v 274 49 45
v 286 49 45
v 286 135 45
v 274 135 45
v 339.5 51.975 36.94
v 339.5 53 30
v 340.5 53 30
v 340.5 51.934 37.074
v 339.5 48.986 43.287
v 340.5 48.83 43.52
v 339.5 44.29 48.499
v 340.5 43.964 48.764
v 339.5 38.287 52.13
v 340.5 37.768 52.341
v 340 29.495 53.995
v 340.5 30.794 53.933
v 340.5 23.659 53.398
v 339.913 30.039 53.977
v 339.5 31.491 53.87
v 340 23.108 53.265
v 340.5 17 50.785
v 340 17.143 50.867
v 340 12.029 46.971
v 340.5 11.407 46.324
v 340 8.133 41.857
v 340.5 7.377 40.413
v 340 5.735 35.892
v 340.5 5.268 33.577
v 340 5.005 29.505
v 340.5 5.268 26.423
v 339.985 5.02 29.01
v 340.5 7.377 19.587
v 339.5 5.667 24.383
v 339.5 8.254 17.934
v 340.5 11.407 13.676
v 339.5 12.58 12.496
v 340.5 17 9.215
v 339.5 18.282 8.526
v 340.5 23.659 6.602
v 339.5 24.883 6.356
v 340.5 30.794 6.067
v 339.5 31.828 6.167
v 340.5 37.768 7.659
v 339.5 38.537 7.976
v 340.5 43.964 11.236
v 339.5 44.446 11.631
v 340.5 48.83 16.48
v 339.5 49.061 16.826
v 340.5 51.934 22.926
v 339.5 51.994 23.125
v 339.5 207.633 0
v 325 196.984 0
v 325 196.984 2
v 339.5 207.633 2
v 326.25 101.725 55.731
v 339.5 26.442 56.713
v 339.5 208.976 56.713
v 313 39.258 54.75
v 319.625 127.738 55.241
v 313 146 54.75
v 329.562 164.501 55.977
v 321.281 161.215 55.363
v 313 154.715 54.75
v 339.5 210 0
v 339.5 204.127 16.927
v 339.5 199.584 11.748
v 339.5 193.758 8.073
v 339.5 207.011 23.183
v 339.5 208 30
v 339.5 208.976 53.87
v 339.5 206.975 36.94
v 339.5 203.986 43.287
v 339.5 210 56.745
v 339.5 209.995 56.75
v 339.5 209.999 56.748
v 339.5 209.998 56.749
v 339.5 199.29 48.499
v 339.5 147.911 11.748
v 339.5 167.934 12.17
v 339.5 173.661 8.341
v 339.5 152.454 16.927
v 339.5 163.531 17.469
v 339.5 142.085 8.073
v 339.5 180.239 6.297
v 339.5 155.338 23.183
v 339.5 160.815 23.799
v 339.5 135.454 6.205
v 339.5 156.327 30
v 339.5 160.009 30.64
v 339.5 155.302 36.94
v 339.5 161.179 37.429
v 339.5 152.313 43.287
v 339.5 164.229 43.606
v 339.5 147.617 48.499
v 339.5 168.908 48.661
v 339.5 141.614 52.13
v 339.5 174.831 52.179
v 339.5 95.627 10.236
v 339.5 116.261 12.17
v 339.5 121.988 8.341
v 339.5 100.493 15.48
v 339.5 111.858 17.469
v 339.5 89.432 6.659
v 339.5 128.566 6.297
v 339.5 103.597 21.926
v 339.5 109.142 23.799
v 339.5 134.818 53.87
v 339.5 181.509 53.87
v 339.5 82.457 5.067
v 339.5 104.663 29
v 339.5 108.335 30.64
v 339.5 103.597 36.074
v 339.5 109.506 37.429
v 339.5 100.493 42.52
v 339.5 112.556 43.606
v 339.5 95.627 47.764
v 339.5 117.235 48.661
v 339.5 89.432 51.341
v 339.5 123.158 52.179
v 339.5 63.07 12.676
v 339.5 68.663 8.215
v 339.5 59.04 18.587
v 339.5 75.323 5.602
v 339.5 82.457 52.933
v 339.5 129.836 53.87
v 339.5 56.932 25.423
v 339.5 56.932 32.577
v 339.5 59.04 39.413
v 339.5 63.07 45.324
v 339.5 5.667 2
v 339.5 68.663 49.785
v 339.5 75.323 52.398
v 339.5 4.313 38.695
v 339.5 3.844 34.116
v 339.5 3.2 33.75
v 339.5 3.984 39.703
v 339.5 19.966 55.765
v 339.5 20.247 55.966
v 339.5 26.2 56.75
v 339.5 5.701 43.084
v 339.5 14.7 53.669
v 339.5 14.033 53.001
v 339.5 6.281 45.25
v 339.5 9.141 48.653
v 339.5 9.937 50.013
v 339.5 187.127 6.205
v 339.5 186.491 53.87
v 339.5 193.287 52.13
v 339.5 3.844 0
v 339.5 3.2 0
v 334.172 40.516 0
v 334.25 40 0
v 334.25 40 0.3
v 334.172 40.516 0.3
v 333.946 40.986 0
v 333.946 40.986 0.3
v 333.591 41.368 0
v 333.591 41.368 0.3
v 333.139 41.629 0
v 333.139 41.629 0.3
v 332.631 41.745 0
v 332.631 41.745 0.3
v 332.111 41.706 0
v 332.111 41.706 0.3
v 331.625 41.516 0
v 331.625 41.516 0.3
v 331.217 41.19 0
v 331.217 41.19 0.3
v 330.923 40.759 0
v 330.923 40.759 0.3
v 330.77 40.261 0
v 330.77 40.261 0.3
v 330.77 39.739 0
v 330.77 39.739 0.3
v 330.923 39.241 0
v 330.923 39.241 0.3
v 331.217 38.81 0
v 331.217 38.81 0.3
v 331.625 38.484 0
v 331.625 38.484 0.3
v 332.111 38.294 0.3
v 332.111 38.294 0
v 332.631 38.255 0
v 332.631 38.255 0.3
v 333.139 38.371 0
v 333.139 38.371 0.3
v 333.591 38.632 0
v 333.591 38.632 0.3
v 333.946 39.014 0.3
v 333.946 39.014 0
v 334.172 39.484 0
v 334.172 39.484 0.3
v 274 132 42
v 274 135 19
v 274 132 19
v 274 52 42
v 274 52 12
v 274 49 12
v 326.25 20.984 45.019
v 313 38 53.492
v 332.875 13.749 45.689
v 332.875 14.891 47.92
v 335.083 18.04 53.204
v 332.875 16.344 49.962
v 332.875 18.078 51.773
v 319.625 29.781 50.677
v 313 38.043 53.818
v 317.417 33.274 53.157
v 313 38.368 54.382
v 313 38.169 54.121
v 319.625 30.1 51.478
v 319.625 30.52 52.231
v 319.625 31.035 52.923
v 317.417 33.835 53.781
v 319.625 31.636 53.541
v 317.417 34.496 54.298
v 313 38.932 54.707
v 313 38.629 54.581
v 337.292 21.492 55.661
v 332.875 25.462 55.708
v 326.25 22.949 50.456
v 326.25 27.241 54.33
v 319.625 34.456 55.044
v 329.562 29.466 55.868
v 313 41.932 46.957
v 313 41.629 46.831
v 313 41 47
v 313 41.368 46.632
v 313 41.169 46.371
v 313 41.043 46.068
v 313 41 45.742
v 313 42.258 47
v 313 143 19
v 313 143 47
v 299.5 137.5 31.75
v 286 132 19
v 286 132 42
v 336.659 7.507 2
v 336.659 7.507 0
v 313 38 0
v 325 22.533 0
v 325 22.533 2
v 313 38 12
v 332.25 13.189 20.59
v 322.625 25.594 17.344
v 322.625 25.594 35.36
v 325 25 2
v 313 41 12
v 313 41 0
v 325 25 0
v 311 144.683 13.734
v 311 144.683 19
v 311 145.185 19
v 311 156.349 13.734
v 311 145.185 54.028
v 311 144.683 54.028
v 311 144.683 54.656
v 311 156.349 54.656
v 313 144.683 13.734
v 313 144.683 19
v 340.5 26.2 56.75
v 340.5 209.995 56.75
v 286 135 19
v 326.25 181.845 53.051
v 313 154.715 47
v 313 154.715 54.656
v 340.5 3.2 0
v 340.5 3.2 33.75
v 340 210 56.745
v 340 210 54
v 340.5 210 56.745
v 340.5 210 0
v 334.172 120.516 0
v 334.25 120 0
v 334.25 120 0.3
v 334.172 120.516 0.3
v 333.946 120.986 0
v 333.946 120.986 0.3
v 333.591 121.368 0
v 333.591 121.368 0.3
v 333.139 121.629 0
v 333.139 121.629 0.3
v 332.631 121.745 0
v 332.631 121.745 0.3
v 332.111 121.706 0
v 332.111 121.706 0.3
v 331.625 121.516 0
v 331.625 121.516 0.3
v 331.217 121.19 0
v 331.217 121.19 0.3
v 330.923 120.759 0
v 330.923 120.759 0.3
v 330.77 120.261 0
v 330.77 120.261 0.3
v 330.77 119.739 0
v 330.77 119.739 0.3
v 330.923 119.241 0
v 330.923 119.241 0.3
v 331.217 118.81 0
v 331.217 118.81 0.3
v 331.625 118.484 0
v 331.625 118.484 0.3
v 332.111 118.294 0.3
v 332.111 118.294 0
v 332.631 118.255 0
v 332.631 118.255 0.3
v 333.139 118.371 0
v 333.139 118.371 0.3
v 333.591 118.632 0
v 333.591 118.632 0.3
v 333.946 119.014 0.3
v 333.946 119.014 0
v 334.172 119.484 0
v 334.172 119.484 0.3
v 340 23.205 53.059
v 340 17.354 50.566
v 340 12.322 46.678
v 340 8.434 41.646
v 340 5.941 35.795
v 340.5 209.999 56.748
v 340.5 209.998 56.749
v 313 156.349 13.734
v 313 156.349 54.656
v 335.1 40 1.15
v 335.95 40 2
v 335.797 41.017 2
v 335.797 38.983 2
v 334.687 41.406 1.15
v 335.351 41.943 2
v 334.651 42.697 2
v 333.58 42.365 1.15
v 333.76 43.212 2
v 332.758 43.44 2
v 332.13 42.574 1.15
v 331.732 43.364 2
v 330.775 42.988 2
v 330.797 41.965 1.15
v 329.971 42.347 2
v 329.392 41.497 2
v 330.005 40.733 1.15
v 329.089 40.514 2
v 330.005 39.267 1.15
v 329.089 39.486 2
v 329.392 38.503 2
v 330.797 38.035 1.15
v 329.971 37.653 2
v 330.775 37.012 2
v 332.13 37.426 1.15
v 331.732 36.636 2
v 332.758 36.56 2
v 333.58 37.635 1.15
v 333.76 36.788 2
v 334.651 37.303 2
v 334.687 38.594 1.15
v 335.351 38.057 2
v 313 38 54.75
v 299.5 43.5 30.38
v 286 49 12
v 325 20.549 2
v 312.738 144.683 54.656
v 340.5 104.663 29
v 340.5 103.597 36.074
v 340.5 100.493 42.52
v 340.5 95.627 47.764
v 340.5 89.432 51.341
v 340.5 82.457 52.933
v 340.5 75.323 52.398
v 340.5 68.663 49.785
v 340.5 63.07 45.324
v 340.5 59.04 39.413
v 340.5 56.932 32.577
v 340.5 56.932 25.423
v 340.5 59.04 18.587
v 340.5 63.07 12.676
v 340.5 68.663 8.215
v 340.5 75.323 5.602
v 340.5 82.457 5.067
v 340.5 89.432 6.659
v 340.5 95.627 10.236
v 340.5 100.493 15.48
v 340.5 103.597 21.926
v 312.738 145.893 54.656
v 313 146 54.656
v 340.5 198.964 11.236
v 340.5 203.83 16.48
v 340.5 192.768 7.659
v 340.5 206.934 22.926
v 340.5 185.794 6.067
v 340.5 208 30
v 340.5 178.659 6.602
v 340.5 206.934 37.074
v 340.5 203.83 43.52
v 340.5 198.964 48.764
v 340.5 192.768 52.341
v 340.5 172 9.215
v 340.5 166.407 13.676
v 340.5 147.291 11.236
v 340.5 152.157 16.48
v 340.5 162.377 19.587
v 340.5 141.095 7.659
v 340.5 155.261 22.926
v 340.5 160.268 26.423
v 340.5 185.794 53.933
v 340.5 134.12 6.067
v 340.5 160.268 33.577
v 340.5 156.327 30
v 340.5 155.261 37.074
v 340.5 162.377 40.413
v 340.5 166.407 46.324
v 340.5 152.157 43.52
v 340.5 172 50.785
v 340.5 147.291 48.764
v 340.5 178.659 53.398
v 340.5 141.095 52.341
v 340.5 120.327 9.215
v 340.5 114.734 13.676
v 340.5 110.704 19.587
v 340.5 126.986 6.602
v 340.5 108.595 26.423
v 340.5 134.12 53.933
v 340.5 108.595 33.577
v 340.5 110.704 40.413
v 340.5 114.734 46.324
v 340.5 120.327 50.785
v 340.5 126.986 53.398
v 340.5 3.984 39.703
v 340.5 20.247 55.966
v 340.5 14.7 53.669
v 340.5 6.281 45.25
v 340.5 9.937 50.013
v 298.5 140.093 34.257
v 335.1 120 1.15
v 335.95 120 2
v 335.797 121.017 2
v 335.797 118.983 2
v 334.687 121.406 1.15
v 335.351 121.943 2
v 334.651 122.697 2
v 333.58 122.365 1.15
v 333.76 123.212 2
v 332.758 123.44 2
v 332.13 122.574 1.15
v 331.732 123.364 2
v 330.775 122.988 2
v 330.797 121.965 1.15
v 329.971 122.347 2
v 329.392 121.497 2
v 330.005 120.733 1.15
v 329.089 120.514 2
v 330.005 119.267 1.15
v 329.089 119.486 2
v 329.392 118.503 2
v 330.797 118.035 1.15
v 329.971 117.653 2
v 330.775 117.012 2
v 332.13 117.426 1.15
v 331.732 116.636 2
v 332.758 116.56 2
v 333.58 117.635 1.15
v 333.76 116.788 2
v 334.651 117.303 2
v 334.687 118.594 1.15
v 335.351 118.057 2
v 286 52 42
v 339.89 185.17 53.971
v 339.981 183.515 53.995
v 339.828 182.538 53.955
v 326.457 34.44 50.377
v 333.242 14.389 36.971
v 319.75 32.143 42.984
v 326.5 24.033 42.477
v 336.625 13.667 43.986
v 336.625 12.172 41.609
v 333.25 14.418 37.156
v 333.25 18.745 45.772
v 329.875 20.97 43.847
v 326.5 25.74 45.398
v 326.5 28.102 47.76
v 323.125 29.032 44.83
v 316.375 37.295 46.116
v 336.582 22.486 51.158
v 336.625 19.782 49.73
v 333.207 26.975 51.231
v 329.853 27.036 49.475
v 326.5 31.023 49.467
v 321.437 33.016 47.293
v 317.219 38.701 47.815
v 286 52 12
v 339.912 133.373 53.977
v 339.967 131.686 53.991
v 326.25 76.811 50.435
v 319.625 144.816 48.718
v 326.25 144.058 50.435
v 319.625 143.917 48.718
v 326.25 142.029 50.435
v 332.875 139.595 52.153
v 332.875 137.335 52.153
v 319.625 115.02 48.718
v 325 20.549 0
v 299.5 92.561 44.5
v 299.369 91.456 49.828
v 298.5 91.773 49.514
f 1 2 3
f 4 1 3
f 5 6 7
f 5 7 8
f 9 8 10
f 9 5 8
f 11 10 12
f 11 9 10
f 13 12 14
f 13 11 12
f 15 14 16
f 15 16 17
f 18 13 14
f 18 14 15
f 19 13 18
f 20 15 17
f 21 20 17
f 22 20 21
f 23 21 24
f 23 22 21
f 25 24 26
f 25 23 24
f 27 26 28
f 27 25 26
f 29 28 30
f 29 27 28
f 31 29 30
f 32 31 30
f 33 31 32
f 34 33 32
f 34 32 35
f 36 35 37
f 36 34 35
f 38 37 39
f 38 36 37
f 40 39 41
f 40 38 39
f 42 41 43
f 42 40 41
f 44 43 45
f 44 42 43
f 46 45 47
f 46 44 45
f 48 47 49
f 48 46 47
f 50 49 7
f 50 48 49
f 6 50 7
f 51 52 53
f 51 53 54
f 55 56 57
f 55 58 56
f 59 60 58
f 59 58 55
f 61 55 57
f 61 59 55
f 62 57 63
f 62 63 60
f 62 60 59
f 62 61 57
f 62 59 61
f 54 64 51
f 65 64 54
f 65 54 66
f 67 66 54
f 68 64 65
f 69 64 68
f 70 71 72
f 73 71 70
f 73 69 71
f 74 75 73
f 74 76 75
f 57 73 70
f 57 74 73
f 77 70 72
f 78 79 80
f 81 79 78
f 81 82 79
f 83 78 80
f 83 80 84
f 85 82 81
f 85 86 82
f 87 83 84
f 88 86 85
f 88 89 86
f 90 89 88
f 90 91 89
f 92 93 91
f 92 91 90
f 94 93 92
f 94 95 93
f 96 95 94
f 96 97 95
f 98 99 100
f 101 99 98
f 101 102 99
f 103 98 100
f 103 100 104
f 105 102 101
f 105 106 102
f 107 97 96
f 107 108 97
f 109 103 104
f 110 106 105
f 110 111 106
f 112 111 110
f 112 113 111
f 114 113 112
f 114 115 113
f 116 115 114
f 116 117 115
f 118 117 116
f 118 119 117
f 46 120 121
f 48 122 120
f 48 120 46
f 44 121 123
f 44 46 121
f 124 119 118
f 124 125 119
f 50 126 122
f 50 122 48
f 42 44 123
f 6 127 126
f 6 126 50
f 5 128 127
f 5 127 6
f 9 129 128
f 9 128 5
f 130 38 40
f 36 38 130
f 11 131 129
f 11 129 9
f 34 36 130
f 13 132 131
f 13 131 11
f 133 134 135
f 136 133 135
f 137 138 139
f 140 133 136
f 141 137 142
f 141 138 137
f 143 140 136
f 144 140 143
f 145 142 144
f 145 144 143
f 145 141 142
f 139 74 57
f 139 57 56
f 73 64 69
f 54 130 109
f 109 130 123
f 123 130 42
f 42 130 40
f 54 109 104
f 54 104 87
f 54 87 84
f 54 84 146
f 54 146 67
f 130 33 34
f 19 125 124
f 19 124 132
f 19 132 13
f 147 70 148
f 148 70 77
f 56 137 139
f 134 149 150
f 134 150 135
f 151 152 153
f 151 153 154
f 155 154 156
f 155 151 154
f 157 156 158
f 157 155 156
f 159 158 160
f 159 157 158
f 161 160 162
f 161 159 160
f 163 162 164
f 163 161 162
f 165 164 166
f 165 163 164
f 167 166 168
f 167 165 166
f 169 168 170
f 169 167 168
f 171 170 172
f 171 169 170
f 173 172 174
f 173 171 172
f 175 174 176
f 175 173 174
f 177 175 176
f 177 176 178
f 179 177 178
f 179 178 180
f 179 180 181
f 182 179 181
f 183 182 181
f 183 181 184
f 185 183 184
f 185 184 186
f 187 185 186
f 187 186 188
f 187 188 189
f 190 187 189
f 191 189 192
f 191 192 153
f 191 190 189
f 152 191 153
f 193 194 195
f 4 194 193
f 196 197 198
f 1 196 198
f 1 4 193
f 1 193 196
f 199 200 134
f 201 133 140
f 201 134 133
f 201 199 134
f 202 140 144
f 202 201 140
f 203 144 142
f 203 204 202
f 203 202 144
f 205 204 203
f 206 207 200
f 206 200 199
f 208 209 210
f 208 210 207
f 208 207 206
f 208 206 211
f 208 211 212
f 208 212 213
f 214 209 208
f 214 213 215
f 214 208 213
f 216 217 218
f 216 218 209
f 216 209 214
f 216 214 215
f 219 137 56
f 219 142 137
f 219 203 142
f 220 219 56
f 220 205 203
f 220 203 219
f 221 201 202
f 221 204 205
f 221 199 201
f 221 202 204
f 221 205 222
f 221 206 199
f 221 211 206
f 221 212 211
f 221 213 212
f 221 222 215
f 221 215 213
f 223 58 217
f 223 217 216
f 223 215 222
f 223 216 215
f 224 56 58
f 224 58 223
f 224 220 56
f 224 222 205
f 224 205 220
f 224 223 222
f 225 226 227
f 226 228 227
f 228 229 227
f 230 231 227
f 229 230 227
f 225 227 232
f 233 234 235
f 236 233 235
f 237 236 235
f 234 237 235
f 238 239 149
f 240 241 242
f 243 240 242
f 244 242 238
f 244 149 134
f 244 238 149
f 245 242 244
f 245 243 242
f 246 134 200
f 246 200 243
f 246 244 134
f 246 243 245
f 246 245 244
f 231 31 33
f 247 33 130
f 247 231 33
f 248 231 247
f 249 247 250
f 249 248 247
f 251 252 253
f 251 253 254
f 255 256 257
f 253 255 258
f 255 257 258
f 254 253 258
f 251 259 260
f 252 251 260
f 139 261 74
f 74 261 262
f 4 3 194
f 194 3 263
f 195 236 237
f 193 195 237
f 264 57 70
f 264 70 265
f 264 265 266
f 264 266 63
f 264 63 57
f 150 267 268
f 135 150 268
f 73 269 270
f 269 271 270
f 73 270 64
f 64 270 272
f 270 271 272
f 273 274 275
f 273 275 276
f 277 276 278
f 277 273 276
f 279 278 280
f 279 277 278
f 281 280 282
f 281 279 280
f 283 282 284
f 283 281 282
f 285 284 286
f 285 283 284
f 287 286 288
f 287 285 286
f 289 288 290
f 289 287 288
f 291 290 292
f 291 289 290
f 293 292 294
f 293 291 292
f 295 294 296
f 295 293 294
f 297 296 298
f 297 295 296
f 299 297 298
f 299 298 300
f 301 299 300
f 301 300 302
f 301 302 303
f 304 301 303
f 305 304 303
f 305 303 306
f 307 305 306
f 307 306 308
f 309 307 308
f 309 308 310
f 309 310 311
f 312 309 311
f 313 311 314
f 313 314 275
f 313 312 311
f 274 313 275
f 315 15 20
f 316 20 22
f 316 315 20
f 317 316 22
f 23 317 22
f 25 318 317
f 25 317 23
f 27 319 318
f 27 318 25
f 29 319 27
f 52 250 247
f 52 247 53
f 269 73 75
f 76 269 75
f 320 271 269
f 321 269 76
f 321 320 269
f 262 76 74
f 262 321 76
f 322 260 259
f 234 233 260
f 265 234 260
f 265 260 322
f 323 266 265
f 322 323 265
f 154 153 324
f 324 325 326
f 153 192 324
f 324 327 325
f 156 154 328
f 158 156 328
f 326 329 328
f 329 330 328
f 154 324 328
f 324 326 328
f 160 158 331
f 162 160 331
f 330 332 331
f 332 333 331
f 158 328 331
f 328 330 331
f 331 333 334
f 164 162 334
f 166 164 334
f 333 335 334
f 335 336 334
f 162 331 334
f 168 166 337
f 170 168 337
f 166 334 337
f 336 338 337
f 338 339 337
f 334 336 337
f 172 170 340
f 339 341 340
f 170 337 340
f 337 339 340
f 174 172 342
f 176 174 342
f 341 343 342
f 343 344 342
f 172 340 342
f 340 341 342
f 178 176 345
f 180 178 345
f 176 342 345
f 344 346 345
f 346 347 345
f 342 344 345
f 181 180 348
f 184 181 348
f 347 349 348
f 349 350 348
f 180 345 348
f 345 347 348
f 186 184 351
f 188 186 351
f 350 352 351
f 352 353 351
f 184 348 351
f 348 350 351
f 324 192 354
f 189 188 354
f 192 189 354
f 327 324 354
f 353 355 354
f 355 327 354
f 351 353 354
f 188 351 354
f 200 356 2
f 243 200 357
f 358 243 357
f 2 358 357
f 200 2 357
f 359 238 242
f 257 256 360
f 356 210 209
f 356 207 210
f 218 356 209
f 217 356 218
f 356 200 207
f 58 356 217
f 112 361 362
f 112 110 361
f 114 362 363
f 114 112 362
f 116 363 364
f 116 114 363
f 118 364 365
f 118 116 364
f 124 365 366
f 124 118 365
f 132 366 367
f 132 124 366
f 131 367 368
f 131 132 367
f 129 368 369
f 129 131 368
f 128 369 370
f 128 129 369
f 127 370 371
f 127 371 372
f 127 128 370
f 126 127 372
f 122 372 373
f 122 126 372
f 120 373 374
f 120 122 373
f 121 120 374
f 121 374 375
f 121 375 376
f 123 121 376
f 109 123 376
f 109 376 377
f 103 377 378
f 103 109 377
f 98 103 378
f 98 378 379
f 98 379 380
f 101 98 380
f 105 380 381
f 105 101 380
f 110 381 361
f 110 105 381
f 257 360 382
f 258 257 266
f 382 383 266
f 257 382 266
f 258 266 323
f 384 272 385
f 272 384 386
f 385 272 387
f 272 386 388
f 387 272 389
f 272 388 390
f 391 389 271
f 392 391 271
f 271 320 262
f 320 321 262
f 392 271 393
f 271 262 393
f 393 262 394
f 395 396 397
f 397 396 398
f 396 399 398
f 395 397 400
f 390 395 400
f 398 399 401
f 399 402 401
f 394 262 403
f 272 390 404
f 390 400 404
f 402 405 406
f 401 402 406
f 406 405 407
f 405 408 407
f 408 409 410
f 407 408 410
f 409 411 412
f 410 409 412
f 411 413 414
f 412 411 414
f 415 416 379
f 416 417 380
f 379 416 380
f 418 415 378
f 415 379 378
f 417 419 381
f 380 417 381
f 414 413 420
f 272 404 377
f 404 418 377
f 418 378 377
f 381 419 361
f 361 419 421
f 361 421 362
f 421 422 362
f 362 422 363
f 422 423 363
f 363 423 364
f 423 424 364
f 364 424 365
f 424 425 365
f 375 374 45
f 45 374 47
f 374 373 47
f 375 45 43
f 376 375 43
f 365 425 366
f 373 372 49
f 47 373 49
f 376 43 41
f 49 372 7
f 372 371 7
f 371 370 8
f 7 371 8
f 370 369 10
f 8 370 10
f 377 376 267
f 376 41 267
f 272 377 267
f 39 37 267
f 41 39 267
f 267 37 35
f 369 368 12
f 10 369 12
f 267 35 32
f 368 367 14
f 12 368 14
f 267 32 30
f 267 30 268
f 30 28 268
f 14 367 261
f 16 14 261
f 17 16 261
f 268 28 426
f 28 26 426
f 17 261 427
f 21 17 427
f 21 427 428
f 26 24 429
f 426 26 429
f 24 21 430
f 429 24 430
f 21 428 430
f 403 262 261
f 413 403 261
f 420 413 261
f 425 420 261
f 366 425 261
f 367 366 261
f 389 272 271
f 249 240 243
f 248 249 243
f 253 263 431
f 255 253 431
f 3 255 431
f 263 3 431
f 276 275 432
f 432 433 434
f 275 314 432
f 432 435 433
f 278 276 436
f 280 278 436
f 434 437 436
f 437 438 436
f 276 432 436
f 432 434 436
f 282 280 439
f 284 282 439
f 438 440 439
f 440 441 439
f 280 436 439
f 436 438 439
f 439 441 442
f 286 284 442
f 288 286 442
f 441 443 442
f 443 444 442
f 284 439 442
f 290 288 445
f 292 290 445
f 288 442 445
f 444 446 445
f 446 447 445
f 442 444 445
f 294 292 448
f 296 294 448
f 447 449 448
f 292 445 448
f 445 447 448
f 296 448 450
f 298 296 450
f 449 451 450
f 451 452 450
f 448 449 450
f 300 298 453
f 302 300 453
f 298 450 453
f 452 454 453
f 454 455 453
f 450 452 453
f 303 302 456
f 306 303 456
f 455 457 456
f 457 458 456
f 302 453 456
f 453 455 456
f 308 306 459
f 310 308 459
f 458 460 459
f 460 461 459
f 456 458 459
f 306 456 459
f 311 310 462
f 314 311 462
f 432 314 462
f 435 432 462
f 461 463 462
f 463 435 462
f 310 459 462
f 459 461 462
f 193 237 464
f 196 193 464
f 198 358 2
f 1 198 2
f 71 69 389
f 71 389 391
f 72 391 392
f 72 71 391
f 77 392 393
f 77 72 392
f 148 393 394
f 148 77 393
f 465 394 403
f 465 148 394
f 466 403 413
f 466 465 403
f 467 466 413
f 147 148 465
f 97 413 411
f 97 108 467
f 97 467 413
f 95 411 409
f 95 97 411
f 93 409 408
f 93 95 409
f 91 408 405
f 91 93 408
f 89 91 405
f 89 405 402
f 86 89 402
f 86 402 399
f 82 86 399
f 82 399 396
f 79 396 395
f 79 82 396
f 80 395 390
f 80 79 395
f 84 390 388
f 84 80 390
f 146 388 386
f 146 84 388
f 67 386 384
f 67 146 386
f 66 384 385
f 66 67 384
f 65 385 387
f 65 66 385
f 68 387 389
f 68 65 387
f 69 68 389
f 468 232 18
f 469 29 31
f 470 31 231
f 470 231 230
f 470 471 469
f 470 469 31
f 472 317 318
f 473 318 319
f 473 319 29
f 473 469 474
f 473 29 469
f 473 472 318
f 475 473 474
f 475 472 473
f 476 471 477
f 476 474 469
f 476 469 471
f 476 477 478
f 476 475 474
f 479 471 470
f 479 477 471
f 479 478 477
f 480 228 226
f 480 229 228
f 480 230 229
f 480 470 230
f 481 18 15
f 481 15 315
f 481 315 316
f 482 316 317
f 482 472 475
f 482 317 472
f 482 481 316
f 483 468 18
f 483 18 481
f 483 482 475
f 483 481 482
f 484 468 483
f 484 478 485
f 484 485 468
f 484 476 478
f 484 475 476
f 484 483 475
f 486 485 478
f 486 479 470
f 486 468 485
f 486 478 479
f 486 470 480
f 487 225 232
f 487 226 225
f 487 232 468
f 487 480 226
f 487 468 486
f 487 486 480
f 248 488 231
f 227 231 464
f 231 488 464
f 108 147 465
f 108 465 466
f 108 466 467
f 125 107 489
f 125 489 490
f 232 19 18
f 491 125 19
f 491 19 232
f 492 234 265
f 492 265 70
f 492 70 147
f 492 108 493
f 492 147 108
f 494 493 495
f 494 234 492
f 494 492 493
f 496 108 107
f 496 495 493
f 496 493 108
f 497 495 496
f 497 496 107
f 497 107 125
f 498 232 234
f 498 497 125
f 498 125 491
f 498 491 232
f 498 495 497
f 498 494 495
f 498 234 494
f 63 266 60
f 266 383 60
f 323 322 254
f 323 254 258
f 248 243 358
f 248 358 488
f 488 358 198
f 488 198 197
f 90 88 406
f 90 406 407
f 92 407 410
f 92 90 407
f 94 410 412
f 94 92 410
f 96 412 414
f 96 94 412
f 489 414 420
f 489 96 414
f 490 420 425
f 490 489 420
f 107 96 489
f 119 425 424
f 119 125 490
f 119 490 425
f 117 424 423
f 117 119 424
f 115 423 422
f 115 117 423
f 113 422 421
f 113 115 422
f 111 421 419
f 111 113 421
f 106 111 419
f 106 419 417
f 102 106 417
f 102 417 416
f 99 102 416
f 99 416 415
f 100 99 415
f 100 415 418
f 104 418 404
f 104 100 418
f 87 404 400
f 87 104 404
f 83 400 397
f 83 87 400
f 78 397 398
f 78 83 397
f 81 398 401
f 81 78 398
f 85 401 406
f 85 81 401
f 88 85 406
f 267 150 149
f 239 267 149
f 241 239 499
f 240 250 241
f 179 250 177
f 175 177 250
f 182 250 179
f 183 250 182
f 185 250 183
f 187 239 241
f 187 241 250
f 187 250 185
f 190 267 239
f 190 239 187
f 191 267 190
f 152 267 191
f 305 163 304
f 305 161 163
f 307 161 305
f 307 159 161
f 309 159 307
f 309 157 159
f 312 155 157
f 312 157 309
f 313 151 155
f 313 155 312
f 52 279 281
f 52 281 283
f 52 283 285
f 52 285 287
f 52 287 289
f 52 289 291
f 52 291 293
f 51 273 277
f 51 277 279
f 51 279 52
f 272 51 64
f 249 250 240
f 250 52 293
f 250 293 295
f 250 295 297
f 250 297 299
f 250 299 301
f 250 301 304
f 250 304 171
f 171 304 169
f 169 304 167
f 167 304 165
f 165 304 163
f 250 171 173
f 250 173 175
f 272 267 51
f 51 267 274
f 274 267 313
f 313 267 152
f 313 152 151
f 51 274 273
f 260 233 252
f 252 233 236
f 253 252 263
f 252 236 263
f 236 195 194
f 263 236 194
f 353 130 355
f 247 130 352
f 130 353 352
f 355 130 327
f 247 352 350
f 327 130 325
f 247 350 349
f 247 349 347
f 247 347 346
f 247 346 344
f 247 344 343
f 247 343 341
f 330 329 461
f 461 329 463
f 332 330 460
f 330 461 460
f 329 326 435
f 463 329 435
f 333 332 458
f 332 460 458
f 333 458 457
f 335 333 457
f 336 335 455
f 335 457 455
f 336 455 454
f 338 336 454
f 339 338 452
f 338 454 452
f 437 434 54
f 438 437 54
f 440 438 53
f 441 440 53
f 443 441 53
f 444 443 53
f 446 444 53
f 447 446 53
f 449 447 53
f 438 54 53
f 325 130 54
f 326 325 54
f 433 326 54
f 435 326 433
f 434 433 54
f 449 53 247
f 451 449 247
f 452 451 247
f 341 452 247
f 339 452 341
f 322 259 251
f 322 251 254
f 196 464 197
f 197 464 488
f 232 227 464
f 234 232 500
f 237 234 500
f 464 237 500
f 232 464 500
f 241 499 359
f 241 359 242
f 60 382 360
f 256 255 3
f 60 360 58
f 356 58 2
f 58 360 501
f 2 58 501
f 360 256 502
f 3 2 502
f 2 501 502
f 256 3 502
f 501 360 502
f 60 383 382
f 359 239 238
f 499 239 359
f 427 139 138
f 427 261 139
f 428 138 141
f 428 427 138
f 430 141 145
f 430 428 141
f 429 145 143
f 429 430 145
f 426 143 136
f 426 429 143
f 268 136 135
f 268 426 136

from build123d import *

# Parameters (mm, degrees)
PAD027_DEPTH    = 12
SKETCH076_R     = 1.75
PAD037_DEPTH    = 2
CHAMFER008_SIZE = 1.7
SKETCH098_R     = 24
PAD052_DEPTH    = 0.5
SKETCH099_W     = 11.665924
SKETCH099_H     = 40.921475
PAD053_DEPTH    = 2


with BuildPart() as part:
    # Sketch058 (on DatumPlane) → Pad027 (new body)
    with BuildSketch(Plane.YZ.offset(286)):
        Polygon((49, 12), (49, 45), (135, 45), (135, 19), (132, 19), (132, 42), (52, 42), (52, 12), align=None)
    extrude(amount=-PAD027_DEPTH)

    # Sketch060 (on DatumPlane) → AdditiveLoft001 section 0
    with BuildSketch(Plane.YZ.offset(313)):
        Polygon((41, 12), (41, 47), (143, 47), (143, 19), (146, 19), (146, 54.75), (38, 54.75), (38, 12), align=None)
    # Sketch059 (on DatumPlane) → AdditiveLoft001 section 1
    with BuildSketch(Plane.YZ.offset(286)):
        Polygon((49, 12), (49, 45), (135, 45), (135, 19), (132, 19), (132, 42), (52, 42), (52, 12), align=None)
    loft()

    # Sketch062 (on DatumPlane) → AdditiveLoft002 section 0
    with BuildSketch(Plane.YZ.offset(340)):
        with BuildLine():
            Line((3.2, 0), (3.2, 33.75))
            ThreePointArc((26.2, 56.75), (9.936544, 50.013456), (3.2, 33.75))
            Line((26.2, 56.75), (187, 56.75))
            Line((210, 56.75), (187, 56.75))
            Line((210, 54), (210, 56.75))
            Line((183, 54), (210, 54))
            Line((183, 54), (30, 54))
            ThreePointArc((30, 54), (12.32233, 46.67767), (5, 29))
            Line((5, 29), (5, 0))
            Line((5, 0), (3.2, 0))
        make_face()
    # Sketch061 (on DatumPlane) → AdditiveLoft002 section 1
    with BuildSketch(Plane.YZ.offset(313)):
        with BuildLine():
            Line((41, 0), (41, 45.742159))
            ThreePointArc((42.257841, 47), (41.368413, 46.631587), (41, 45.742159))
            Line((42.257841, 47), (141.742159, 47))
            Line((141.742159, 47), (154.714584, 47))
            Line((154.714584, 47), (154.714584, 54.75))
            Line((154.714584, 54.75), (144.742159, 54.75))
            Line((144.742159, 54.75), (39.257841, 54.75))
            ThreePointArc((39.257841, 54.75), (38.368413, 54.381587), (38, 53.492159))
            Line((38, 53.492159), (38, 0))
            Line((38, 0), (41, 0))
        make_face()
    loft()

    # Sketch076 → Pad037 (join)
    with BuildSketch(Plane.XY):
        Polygon((340, 208), (340, 3.768617), (325, 20.549414), (325, 196.984344), align=None)
        with Locations((332.5, 40)):
            Circle(SKETCH076_R, mode=Mode.SUBTRACT)
        with Locations((332.5, 120)):
            Circle(SKETCH076_R, mode=Mode.SUBTRACT)
    extrude(amount=PAD037_DEPTH)

    # Chamfer008
    chamfer008_edges = [part.edges().sort_by_distance(p)[0] for p in [
        (330.75, 120, 2),
        (330.75, 40, 2),
    ]]
    chamfer(chamfer008_edges, length=CHAMFER008_SIZE)

    # Sketch098 (on DatumPlane) → Pad052 (join, symmetric)
    with BuildSketch(Plane.YZ.offset(340)):
        with BuildLine():
            Line((3.2, 0), (3.2, 33.75))
            ThreePointArc((26.2, 56.75), (9.936544, 50.013456), (3.2, 33.75))
            Line((26.2, 56.75), (209.995, 56.75))
            ThreePointArc((210, 56.745), (209.998536, 56.748536), (209.995, 56.75))
            Line((210, 56.745), (210, 0))
            Line((210, 0), (208, 0))
            Line((5, 0), (208, 0))
            Line((5, 0), (3.2, 0))
        make_face()
        with Locations((29, 30)):
            Circle(SKETCH098_R, mode=Mode.SUBTRACT)
        with Locations((184, 30)):
            Circle(SKETCH098_R, mode=Mode.SUBTRACT)
        with Locations((80.663441, 29)):
            Circle(SKETCH098_R, mode=Mode.SUBTRACT)
        with Locations((132.326882, 30)):
            Circle(SKETCH098_R, mode=Mode.SUBTRACT)
    extrude(amount=PAD052_DEPTH, both=True)

    # Sketch099 (on DatumPlane) → Pad053 (join)
    with BuildSketch(Plane.YZ.offset(313)):
        with Locations((150.516098, 34.194787)):
            Rectangle(SKETCH099_W, SKETCH099_H)
    extrude(amount=-PAD053_DEPTH)


solid = part.part
